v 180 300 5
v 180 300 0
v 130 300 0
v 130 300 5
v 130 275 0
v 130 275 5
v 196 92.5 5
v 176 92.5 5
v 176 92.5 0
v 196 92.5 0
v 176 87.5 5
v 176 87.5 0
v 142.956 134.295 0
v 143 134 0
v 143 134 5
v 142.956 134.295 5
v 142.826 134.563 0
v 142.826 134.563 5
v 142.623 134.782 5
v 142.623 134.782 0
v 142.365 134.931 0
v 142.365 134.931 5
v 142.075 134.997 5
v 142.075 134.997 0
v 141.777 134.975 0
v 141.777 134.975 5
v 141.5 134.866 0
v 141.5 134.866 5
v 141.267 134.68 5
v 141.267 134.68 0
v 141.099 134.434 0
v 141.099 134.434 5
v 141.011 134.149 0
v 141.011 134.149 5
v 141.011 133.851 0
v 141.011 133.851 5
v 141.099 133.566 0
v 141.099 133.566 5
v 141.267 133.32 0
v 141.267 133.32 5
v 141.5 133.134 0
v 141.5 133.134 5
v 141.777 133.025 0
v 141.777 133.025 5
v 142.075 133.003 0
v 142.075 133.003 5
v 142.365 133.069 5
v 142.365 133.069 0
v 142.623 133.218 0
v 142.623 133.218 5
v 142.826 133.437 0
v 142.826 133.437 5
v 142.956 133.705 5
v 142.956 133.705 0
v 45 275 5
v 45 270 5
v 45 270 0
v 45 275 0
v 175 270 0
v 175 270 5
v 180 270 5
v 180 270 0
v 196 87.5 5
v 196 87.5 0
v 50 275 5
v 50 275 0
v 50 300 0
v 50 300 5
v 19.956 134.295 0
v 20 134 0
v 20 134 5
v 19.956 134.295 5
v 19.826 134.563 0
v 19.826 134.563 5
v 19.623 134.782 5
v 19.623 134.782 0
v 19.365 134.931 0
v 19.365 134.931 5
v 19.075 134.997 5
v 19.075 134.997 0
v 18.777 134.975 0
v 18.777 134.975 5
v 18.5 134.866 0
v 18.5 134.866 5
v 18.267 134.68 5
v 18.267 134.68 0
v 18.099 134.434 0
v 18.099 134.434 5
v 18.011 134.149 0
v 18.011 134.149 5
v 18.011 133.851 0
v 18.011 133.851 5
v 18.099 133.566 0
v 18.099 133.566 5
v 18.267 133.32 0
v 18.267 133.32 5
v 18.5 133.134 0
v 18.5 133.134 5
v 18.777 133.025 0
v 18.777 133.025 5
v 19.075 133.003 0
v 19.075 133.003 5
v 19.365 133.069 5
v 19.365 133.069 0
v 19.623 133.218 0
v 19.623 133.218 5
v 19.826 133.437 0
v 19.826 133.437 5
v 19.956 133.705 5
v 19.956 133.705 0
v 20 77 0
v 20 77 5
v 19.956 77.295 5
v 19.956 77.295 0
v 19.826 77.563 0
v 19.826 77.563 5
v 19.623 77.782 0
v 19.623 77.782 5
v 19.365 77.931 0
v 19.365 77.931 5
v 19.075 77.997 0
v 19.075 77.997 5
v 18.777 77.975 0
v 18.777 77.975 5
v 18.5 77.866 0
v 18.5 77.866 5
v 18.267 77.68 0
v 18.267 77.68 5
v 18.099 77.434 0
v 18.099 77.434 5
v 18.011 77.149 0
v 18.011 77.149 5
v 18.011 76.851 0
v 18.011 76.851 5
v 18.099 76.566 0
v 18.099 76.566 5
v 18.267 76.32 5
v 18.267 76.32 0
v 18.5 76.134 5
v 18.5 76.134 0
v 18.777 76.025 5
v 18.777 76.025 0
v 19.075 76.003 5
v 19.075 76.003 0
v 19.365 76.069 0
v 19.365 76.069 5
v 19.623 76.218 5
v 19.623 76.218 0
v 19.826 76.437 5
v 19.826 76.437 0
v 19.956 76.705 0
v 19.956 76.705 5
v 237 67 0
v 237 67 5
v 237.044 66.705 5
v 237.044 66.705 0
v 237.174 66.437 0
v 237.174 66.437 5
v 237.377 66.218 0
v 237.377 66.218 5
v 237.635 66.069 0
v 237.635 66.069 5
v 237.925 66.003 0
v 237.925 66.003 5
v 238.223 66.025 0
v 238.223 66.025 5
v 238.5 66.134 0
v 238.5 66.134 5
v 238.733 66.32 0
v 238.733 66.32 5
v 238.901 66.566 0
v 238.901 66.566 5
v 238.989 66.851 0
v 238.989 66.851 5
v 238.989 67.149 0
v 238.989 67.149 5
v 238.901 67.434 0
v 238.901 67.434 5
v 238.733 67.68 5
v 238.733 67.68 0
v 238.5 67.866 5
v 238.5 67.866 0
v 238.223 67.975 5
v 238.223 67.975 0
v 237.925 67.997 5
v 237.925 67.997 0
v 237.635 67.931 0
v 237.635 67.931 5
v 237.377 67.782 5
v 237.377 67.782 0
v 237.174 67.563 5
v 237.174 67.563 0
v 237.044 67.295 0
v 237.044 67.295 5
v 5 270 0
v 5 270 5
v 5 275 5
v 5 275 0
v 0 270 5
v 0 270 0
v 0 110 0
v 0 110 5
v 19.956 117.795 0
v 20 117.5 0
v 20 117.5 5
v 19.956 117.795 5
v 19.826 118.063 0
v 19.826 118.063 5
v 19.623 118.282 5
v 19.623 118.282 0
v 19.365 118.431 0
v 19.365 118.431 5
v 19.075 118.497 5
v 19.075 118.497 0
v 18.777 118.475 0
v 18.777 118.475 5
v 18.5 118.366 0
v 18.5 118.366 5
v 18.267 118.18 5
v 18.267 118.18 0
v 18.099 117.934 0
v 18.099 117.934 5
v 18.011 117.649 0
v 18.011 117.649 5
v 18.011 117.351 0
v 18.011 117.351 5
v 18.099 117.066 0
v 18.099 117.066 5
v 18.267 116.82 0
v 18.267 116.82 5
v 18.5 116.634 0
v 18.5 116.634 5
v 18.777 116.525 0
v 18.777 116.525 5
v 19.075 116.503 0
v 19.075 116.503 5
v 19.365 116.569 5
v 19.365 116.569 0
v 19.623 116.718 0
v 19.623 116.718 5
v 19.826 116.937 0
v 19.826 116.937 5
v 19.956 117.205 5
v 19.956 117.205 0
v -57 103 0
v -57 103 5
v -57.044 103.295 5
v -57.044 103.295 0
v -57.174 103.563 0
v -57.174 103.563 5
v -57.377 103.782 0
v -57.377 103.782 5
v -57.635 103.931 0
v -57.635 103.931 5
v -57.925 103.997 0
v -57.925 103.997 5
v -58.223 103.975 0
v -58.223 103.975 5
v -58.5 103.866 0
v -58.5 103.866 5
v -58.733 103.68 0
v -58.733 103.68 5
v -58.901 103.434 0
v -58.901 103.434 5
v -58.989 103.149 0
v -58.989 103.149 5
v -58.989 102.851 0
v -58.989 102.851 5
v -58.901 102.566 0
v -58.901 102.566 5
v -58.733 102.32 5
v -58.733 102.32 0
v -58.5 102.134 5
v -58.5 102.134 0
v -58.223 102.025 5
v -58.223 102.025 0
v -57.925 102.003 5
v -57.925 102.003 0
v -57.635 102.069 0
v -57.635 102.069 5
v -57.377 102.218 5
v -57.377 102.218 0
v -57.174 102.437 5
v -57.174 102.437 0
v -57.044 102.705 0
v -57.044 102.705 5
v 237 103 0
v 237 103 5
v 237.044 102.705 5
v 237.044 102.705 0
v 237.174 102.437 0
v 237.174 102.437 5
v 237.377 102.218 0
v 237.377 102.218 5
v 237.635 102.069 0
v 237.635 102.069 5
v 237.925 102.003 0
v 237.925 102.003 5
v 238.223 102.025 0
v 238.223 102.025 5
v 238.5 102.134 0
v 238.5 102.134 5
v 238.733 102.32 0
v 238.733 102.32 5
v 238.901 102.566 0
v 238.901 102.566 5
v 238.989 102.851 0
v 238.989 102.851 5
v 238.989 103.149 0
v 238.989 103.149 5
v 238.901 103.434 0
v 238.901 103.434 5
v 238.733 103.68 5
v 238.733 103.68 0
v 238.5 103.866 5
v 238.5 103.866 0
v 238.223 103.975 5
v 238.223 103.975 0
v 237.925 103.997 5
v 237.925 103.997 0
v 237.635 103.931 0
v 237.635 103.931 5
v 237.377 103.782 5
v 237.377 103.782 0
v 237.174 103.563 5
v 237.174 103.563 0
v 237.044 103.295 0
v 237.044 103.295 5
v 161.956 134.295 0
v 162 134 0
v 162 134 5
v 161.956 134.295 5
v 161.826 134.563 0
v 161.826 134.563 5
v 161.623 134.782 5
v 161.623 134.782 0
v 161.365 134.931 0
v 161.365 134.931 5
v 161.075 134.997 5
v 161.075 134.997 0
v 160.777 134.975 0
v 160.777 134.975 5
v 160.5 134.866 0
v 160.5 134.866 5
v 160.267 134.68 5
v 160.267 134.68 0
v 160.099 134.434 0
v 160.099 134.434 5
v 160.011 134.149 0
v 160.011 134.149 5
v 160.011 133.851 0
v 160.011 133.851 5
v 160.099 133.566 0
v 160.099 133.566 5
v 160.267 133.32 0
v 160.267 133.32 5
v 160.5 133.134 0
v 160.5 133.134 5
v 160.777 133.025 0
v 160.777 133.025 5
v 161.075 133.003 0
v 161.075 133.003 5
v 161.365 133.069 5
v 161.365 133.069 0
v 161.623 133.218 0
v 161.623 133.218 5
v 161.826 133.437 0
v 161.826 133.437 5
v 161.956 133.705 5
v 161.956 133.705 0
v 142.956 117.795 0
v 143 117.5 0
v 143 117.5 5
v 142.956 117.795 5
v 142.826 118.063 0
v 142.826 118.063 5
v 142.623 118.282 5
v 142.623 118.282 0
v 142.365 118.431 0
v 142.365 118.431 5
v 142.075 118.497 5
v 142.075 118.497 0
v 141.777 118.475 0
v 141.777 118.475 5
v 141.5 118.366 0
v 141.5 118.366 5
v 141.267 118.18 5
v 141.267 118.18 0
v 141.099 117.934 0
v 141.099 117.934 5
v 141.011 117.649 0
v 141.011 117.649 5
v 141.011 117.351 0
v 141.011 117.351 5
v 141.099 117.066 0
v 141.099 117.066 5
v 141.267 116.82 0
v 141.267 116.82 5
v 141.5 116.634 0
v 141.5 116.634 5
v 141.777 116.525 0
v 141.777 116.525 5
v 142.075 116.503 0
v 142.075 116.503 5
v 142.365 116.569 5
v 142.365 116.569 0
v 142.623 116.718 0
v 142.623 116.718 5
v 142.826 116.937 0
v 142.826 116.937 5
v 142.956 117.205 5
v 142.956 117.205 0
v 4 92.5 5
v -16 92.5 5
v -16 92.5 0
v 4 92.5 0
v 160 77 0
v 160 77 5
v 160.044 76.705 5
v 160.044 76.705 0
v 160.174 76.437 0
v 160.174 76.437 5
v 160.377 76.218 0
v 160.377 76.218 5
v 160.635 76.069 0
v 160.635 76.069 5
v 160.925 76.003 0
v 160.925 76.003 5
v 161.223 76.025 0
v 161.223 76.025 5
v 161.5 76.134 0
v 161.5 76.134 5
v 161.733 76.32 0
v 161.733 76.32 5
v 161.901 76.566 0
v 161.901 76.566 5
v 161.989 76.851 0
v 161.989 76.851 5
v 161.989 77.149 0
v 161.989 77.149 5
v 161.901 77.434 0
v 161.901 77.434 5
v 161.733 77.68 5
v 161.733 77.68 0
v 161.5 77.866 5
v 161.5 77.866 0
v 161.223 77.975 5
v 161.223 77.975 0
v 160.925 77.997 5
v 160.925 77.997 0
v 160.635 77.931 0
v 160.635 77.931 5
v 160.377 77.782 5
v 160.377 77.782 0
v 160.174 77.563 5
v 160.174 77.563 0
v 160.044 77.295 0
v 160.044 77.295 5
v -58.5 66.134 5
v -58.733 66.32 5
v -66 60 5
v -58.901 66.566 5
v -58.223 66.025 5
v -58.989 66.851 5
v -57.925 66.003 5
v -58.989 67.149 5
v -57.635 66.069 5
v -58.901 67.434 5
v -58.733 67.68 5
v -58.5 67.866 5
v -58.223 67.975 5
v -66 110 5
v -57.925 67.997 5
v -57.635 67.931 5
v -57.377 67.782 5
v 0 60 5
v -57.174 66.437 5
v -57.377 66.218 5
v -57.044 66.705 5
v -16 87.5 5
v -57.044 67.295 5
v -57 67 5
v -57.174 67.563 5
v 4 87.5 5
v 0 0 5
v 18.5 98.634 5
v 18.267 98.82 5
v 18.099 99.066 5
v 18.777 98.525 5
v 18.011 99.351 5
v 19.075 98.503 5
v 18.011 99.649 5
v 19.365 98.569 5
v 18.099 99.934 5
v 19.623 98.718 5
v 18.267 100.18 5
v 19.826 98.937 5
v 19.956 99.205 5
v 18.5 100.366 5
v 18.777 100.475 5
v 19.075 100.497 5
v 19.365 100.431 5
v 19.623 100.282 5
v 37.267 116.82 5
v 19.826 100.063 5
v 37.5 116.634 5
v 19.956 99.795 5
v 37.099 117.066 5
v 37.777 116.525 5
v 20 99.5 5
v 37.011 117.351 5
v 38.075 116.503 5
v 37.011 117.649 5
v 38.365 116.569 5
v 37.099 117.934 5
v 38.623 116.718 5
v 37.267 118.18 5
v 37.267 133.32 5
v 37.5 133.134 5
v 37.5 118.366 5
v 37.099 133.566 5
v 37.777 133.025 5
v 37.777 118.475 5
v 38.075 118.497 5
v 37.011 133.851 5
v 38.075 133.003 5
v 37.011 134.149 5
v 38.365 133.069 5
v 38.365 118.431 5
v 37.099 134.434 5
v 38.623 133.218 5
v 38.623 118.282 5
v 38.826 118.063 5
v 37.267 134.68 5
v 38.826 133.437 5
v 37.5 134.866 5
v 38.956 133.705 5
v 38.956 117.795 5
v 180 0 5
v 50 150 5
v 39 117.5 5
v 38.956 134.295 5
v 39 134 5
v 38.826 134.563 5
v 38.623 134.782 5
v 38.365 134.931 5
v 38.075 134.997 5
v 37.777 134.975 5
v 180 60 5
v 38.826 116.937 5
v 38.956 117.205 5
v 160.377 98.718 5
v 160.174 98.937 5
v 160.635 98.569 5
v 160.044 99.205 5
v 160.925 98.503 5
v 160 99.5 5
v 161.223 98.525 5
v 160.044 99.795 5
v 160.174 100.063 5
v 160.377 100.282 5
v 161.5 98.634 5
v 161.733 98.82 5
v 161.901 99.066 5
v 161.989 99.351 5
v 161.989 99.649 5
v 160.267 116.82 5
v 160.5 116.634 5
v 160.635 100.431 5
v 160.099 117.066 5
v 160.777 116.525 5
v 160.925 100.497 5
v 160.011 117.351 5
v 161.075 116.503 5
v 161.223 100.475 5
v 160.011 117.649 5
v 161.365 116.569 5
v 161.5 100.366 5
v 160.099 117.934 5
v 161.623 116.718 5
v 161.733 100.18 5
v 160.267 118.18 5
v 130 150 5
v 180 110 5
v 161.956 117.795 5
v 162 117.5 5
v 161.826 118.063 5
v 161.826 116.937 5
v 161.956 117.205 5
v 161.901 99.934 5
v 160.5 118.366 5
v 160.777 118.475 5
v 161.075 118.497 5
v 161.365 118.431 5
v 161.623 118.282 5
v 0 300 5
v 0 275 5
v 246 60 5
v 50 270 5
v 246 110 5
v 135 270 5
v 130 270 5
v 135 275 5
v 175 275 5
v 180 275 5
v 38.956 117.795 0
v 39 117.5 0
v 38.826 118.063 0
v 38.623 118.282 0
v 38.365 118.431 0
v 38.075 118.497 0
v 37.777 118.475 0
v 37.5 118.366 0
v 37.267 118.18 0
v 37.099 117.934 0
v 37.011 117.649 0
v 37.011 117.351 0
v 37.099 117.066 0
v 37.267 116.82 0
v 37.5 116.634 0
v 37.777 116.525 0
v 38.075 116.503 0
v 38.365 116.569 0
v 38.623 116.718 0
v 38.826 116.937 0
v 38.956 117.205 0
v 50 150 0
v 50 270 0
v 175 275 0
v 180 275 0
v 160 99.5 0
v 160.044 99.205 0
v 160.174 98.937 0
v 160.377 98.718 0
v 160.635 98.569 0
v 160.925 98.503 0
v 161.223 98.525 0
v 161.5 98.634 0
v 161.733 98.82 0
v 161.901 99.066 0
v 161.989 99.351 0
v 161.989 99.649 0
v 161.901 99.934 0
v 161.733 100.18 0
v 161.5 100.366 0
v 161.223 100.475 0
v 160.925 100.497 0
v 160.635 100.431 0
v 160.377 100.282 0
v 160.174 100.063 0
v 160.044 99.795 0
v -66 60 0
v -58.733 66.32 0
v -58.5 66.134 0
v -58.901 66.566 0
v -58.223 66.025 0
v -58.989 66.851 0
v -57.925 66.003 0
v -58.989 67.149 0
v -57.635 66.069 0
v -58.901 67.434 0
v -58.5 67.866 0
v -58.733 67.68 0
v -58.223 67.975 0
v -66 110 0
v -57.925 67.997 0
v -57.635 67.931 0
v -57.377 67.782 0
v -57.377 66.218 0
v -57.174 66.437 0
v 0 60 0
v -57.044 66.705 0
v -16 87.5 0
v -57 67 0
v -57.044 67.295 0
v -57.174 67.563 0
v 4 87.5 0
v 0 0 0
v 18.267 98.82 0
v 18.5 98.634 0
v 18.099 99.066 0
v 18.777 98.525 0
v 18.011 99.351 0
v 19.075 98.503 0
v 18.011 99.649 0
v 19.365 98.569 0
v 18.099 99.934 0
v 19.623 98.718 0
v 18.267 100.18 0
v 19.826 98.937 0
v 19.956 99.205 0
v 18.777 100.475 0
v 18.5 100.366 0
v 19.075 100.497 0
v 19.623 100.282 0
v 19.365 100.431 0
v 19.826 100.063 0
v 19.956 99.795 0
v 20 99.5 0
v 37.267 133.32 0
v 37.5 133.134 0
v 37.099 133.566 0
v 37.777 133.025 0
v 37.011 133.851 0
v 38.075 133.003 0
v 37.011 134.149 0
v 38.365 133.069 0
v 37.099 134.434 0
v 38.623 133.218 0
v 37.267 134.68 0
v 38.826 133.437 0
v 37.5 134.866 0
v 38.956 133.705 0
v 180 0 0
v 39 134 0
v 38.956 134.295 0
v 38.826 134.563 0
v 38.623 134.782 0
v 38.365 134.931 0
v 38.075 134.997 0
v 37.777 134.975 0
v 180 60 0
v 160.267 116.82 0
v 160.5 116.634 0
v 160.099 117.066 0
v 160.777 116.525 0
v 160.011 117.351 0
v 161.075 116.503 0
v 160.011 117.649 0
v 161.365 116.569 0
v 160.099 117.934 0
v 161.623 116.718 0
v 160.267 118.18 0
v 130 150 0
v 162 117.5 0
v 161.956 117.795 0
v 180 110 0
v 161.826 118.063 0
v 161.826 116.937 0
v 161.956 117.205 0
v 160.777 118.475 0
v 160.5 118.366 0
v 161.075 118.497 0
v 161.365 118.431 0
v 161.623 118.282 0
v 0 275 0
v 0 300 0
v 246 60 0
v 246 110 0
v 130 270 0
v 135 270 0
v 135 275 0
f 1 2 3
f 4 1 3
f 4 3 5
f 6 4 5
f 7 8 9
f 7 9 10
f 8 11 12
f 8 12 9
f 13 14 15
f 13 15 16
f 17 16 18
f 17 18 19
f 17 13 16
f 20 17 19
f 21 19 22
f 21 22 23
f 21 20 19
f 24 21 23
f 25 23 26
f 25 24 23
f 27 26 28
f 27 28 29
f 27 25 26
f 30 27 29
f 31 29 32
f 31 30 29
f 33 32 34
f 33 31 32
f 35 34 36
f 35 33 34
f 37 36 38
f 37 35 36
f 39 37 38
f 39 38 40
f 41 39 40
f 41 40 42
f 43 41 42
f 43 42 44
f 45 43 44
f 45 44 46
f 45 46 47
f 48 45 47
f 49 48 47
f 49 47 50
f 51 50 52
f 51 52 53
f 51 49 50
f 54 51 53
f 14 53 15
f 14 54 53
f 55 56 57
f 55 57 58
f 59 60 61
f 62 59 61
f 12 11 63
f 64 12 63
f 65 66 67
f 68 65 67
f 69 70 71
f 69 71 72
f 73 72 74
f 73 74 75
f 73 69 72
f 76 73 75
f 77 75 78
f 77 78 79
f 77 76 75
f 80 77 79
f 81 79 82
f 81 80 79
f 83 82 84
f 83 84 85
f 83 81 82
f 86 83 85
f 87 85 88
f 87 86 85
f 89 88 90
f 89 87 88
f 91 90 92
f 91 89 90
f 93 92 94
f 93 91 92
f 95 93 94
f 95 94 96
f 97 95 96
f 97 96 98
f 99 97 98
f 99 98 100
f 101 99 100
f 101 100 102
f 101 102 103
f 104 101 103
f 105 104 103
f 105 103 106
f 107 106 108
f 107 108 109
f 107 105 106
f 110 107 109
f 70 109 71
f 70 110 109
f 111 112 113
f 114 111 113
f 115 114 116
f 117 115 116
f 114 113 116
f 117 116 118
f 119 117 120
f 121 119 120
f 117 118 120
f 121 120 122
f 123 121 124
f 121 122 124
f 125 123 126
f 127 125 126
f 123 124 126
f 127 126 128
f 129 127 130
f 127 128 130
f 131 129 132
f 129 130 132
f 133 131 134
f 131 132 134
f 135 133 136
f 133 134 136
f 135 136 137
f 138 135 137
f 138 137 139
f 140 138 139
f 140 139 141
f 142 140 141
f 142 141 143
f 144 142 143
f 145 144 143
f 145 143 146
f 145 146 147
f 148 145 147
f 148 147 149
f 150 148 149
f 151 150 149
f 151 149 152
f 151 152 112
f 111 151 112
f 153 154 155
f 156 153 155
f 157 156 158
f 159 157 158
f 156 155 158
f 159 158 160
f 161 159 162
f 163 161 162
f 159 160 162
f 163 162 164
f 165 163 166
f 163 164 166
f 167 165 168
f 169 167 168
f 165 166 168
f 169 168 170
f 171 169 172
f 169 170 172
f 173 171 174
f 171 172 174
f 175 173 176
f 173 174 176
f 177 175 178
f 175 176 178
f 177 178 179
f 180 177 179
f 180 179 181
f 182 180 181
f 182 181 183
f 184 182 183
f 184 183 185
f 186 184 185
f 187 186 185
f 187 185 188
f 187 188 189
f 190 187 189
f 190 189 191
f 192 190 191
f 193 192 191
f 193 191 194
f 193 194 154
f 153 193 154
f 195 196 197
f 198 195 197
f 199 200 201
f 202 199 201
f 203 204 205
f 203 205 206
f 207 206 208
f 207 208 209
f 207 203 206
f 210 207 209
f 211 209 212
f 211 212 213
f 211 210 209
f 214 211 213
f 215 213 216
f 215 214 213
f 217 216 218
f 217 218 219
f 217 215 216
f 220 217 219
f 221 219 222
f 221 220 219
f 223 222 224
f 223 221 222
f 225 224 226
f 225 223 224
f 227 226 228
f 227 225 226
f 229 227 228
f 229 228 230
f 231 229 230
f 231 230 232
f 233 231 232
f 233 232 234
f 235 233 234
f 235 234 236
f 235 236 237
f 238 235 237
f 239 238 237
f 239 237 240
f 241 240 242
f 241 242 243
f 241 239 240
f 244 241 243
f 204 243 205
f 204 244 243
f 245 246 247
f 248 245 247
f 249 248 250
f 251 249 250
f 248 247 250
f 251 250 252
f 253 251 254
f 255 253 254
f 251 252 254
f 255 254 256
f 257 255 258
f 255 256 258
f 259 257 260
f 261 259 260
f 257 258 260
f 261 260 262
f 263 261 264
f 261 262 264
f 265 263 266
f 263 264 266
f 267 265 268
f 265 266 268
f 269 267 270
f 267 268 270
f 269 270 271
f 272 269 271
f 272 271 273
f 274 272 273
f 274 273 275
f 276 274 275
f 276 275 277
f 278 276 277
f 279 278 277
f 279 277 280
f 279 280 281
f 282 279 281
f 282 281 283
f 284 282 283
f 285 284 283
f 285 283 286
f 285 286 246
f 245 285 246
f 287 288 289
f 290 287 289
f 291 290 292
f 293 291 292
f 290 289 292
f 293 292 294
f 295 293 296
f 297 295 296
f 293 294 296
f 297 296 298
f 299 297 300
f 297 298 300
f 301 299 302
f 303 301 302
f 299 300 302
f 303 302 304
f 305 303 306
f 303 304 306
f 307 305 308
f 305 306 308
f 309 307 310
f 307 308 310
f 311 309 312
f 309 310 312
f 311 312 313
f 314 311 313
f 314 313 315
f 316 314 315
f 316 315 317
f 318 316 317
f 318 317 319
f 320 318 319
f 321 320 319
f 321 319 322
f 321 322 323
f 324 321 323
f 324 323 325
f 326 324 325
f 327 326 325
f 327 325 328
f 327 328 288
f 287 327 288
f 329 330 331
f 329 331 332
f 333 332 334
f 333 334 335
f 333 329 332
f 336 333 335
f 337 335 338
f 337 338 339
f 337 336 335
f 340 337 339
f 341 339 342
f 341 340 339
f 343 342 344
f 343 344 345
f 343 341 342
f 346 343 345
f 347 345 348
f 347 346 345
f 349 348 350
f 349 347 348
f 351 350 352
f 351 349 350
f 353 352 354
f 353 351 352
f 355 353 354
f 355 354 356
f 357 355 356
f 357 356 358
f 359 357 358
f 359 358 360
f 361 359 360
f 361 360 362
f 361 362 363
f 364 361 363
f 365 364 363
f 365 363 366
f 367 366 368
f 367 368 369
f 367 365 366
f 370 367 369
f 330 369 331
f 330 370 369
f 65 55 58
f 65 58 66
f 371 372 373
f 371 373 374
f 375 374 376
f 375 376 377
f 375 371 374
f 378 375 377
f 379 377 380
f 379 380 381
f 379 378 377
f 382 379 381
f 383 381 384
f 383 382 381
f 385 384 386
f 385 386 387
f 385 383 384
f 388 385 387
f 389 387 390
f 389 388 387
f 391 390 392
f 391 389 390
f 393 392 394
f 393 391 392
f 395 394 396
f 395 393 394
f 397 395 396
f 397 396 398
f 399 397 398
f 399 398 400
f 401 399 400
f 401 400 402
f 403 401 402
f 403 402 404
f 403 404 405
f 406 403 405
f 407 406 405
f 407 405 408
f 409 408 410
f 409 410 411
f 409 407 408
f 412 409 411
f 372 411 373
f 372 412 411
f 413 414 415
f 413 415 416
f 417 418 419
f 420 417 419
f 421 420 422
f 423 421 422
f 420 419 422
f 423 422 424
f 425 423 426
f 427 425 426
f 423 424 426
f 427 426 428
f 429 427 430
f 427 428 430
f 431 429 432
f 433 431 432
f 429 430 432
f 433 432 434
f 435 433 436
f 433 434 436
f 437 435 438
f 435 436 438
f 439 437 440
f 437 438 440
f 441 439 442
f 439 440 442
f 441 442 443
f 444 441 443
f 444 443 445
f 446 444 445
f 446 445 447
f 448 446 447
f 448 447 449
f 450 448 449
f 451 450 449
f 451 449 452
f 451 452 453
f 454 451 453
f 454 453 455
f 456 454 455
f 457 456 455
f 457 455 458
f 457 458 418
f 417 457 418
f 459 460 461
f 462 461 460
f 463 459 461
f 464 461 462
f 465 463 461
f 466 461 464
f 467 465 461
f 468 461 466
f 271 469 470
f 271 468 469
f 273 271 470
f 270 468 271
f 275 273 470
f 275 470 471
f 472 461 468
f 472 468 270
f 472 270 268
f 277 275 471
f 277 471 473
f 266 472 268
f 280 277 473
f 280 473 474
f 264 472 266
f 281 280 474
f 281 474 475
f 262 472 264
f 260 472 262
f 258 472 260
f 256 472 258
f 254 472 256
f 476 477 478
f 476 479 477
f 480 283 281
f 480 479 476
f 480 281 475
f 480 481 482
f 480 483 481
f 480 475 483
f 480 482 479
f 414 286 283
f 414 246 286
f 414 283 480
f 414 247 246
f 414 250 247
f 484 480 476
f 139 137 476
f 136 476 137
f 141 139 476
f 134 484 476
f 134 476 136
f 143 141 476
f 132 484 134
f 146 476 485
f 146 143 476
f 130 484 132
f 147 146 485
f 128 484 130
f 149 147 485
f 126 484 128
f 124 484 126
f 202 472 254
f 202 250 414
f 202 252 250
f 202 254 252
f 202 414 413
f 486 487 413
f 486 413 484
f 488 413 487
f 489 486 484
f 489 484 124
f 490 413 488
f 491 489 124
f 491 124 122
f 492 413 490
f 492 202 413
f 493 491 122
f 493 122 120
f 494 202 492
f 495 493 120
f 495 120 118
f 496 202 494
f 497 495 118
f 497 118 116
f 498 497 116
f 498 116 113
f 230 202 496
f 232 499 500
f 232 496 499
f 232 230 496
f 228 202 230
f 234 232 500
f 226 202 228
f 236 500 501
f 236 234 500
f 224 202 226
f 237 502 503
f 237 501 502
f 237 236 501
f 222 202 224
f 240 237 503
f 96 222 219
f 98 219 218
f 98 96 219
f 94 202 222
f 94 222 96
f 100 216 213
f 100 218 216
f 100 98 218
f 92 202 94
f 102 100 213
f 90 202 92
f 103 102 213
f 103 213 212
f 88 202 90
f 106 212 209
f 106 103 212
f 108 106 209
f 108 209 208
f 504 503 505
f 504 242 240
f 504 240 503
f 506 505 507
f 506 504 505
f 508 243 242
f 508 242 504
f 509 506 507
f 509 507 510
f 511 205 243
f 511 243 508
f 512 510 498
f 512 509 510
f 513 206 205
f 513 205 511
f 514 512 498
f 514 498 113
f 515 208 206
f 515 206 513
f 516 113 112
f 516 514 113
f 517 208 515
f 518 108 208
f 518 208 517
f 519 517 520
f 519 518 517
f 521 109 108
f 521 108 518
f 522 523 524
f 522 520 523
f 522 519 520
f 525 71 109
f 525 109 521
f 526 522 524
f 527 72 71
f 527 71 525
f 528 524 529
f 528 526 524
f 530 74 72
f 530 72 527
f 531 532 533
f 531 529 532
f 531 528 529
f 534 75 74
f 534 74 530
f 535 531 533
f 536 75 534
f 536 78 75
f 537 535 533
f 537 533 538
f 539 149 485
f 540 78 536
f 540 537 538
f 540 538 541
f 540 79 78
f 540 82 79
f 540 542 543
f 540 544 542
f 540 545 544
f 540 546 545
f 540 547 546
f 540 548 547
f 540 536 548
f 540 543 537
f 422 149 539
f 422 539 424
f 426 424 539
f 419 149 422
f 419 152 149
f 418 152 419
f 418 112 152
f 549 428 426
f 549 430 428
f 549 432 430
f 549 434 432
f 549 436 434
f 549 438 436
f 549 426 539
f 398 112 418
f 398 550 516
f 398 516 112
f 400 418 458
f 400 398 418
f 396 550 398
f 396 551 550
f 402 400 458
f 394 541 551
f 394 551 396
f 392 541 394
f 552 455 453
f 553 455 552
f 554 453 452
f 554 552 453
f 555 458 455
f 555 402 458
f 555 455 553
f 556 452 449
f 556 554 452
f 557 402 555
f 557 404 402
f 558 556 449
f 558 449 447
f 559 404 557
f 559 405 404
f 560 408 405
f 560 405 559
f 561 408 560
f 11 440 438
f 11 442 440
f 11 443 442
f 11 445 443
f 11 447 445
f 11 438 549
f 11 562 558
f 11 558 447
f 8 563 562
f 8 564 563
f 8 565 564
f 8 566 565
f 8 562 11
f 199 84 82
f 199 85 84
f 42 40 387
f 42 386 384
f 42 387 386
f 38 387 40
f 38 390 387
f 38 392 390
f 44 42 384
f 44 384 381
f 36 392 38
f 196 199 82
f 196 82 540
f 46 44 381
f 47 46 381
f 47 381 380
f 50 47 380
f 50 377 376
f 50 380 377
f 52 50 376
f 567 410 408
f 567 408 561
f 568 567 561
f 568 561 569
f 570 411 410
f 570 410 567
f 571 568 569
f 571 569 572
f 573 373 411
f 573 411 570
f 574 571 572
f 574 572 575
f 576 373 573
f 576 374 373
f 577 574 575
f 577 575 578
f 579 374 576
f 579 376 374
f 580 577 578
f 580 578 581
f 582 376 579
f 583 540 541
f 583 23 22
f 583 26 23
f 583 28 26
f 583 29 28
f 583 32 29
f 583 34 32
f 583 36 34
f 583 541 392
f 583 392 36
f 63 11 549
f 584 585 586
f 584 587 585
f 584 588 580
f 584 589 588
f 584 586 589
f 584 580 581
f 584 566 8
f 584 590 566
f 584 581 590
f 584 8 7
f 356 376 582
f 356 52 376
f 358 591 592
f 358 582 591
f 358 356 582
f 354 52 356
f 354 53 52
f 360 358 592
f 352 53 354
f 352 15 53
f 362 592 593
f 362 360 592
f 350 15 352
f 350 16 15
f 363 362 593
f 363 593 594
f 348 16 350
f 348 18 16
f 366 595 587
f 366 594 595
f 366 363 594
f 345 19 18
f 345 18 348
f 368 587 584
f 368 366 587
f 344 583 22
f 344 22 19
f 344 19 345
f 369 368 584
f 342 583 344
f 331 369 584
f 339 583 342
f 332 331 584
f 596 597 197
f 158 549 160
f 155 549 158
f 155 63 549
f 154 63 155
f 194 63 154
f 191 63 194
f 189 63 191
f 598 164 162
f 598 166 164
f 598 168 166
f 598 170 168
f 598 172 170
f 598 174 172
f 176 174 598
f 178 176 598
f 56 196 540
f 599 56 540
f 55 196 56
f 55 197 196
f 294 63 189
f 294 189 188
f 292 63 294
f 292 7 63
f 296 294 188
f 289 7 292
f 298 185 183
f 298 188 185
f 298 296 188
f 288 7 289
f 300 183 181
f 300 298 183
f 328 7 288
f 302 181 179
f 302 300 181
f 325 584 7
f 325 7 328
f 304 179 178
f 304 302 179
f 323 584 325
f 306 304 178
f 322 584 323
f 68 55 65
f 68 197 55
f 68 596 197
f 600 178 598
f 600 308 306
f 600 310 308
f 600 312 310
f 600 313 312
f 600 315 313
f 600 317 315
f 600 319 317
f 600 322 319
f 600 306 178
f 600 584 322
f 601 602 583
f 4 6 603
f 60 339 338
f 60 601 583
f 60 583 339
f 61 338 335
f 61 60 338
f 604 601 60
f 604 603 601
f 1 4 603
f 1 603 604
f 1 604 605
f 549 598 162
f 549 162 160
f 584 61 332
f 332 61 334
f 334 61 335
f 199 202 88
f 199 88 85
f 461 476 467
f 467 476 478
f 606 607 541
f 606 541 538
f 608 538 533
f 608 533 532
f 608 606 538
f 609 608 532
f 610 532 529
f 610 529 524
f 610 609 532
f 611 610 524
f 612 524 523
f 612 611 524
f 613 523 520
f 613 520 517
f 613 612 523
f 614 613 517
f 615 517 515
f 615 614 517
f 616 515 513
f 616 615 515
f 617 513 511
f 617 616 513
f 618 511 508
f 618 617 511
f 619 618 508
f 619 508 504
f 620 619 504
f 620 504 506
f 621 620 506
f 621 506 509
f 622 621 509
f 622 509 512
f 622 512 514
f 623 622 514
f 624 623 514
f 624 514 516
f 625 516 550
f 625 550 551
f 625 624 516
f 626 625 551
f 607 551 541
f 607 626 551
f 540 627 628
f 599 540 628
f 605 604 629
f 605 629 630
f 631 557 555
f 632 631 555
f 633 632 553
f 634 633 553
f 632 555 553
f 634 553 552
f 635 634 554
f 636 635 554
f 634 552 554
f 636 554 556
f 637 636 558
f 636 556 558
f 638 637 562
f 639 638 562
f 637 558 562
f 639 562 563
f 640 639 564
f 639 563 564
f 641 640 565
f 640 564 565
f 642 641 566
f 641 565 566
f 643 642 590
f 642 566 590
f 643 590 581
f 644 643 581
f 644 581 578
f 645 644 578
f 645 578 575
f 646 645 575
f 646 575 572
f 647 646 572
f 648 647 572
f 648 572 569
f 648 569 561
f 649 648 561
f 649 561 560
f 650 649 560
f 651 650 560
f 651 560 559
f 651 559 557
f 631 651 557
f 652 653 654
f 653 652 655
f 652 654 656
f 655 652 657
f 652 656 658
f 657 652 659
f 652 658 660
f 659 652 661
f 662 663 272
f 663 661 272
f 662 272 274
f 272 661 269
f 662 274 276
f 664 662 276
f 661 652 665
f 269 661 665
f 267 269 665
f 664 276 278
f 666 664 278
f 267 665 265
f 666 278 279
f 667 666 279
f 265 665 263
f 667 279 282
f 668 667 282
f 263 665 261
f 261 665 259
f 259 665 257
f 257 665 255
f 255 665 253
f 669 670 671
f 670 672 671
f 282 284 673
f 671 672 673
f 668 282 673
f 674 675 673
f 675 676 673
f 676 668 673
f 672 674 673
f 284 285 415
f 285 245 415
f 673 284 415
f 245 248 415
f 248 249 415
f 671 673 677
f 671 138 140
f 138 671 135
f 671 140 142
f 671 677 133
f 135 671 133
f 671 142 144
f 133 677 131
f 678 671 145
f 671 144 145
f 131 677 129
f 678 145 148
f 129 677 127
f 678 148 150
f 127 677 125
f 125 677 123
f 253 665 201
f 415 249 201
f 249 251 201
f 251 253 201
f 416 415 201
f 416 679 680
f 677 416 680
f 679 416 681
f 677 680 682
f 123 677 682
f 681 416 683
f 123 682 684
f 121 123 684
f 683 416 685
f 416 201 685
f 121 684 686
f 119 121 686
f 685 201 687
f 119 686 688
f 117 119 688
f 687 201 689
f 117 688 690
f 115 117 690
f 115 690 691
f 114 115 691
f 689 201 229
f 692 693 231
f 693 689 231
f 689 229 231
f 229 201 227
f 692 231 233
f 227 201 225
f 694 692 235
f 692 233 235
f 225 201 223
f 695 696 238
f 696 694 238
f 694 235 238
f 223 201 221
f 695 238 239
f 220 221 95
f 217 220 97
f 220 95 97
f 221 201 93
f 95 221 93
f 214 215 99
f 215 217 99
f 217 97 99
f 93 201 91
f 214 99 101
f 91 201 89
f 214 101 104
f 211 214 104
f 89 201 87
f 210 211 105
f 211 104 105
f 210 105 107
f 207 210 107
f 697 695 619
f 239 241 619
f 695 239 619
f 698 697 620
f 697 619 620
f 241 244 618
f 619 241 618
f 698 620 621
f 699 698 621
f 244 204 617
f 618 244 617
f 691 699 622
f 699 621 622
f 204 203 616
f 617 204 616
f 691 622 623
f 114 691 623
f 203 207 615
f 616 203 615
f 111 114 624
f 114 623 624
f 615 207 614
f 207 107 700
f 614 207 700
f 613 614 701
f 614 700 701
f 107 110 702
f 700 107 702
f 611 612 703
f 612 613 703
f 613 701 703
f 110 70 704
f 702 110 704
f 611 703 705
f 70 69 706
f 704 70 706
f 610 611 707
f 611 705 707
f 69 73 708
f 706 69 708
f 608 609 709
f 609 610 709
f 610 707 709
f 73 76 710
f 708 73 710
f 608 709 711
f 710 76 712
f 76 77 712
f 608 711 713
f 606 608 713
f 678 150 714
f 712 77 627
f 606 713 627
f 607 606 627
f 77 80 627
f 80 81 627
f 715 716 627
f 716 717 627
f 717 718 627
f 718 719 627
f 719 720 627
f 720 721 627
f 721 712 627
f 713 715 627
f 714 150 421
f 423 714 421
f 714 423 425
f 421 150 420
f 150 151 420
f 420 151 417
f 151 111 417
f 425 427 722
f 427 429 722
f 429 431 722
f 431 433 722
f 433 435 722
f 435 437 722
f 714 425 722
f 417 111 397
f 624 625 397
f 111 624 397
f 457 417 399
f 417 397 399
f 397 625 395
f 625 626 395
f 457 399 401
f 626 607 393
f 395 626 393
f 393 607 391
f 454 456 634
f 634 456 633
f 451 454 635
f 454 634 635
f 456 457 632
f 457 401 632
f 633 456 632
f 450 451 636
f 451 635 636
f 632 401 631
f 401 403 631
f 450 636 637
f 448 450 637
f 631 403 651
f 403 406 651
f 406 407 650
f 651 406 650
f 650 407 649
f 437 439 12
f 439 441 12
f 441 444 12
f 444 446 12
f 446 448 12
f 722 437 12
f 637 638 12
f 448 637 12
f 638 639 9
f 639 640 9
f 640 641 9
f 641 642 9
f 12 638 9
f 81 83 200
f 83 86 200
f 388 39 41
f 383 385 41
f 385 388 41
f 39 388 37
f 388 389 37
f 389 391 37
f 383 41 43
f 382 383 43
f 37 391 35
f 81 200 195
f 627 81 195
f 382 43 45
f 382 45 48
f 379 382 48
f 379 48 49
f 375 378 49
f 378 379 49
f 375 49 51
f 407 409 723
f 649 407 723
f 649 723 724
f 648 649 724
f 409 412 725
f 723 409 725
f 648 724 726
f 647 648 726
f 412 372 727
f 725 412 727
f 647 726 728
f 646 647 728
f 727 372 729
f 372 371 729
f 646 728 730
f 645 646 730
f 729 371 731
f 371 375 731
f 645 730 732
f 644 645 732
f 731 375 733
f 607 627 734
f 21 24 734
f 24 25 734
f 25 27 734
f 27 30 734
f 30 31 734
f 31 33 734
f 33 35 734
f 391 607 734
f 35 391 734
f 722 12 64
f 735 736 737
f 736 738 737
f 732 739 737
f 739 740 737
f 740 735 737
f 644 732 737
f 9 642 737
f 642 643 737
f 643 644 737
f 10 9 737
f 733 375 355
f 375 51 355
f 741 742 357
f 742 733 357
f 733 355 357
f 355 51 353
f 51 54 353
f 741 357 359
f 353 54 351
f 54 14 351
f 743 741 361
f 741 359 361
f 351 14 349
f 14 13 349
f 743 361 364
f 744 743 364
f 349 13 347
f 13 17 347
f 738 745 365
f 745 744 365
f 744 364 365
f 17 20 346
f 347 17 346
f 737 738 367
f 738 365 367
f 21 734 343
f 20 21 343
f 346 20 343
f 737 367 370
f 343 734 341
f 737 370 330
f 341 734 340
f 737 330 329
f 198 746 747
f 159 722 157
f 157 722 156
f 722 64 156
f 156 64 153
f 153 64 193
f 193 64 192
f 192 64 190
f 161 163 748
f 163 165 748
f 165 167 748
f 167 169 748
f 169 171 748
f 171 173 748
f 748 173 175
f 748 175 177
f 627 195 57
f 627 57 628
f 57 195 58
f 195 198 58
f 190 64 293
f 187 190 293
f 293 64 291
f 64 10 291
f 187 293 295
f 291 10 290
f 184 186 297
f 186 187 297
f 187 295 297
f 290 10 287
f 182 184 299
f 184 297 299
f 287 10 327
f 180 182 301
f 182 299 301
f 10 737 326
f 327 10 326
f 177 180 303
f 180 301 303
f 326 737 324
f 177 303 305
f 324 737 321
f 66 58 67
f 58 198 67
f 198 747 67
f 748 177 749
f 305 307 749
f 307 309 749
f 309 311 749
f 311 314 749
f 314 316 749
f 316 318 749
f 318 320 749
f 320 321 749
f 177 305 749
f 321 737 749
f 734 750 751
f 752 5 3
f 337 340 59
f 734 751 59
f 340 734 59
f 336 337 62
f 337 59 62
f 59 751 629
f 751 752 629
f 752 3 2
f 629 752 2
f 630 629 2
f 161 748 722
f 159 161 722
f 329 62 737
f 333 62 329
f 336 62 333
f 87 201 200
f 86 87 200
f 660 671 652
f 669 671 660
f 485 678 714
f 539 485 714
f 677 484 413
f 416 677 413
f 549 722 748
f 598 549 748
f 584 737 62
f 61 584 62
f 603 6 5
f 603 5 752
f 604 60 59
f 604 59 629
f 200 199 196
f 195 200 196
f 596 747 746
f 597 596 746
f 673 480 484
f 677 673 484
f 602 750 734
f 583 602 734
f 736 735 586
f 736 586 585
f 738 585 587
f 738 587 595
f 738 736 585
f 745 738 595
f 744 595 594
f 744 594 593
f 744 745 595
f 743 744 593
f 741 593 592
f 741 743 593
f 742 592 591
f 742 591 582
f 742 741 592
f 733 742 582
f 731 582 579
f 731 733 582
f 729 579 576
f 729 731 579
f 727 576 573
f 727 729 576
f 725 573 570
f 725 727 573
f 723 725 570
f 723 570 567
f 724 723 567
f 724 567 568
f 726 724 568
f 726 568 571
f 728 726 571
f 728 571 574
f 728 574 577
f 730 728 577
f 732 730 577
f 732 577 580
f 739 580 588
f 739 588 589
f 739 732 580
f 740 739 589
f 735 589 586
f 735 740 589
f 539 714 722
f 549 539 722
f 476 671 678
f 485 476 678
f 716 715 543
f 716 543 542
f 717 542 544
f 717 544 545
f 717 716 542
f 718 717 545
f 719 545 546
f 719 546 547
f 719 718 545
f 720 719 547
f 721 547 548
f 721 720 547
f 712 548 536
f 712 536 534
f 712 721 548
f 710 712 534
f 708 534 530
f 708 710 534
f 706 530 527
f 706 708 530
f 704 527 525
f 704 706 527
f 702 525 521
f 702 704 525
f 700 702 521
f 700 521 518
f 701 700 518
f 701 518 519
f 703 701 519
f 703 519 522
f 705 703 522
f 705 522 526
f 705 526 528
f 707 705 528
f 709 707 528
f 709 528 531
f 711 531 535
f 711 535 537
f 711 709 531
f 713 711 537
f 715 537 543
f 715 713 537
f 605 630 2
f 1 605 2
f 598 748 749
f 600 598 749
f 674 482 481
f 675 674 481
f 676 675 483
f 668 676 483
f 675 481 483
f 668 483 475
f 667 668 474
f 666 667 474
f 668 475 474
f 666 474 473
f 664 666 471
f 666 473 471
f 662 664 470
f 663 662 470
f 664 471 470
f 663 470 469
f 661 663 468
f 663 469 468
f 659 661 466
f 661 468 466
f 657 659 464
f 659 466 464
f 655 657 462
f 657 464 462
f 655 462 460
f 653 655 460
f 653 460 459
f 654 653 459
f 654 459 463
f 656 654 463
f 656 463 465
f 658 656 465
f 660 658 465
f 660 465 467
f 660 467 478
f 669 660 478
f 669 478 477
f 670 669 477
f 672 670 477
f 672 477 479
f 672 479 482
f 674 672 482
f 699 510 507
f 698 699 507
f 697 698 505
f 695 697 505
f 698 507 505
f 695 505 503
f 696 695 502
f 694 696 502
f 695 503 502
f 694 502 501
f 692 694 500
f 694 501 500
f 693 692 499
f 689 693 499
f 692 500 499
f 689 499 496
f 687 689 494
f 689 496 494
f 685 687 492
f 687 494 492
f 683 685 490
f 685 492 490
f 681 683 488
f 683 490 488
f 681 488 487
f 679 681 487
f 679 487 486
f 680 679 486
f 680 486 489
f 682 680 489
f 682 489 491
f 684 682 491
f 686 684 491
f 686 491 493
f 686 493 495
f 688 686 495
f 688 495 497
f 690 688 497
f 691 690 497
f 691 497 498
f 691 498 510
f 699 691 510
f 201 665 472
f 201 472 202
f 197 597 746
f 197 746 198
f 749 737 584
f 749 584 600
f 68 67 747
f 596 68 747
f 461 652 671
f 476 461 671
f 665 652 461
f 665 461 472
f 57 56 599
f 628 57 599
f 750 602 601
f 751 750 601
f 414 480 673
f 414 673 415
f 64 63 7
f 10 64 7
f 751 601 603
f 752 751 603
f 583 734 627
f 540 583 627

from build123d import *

# Parameters (mm, degrees)
SKETCH1_W           = 66
SKETCH1_H           = 50
SKETCH1_R           = 1
BOSS_EXTRUDE1_DEPTH = 5
SKETCH2_R           = 1
CUT_EXTRUDE1_DEPTH  = 388.996134001
SKETCH3_R           = 1
SKETCH3_W           = 20
SKETCH3_H           = 5
CUT_EXTRUDE2_DEPTH  = 388.996134001
SKETCH4_W           = 5
SKETCH4_H           = 5
CUT_EXTRUDE3_DEPTH  = 388.996134001


with BuildPart() as part:
    # Sketch1 → Boss-Extrude1 (new body)
    # profile 1 of 3: a face of its own
    with BuildSketch(Plane.XY):
        with Locations((-33, 85)):
            Rectangle(SKETCH1_W, SKETCH1_H)
    # profile 2 of 3: a face of its own
    with BuildSketch(Plane.XY):
        Polygon((0, 60), (0, 0), (180, 0), (180, 60), (180, 110), (180, 300), (130, 300), (130, 150), (50, 150), (50, 300), (0, 300), (0, 110), align=None)
        with Locations((19, 117.5)):
            Circle(SKETCH1_R, mode=Mode.SUBTRACT)
        with Locations((38, 117.5)):
            Circle(SKETCH1_R, mode=Mode.SUBTRACT)
        with Locations((19, 134)):
            Circle(SKETCH1_R, mode=Mode.SUBTRACT)
        with Locations((38, 134)):
            Circle(SKETCH1_R, mode=Mode.SUBTRACT)
        with Locations((142, 117.5)):
            Circle(SKETCH1_R, mode=Mode.SUBTRACT)
        with Locations((161, 117.5)):
            Circle(SKETCH1_R, mode=Mode.SUBTRACT)
        with Locations((142, 134)):
            Circle(SKETCH1_R, mode=Mode.SUBTRACT)
        with Locations((161, 134)):
            Circle(SKETCH1_R, mode=Mode.SUBTRACT)
    # profile 3 of 3: a face of its own
    with BuildSketch(Plane.XY):
        with Locations((213, 85)):
            Rectangle(SKETCH1_W, SKETCH1_H)
    extrude(amount=BOSS_EXTRUDE1_DEPTH)

    # Sketch2 → Cut-Extrude1 (cut, through all)
    with BuildSketch(Plane.XY.offset(5)):
        with Locations((-58, 103)):
            Circle(SKETCH2_R)
        with Locations((-58, 67)):
            Circle(SKETCH2_R)
        with Locations(Location((238, 67, 0), (0, 0, 180))):
            Circle(SKETCH2_R)
        with Locations(Location((238, 103, 0), (0, 0, 180))):
            Circle(SKETCH2_R)
    extrude(amount=-CUT_EXTRUDE1_DEPTH, mode=Mode.SUBTRACT)

    # Sketch3 → Cut-Extrude2 (cut, through all)
    with BuildSketch(Plane.XY.offset(5)):
        with Locations((19, 77)):
            Circle(SKETCH3_R)
        with Locations((19, 99.5)):
            Circle(SKETCH3_R)
        with Locations(Location((161, 77, 0), (0, 0, 180))):
            Circle(SKETCH3_R)
        with Locations(Location((161, 99.5, 0), (0, 0, 180))):
            Circle(SKETCH3_R)
        with Locations((-6, 90)):
            Rectangle(SKETCH3_W, SKETCH3_H)
        with Locations((186, 90)):
            Rectangle(SKETCH3_W, SKETCH3_H)
    extrude(amount=-CUT_EXTRUDE2_DEPTH, mode=Mode.SUBTRACT)

    # Sketch4 → Cut-Extrude3 (cut, through all)
    with BuildSketch(Plane.XY.offset(5)):
        with Locations((2.5, 272.5)):
            Rectangle(SKETCH4_W, SKETCH4_H)
        with Locations((47.5, 272.5)):
            Rectangle(SKETCH4_W, SKETCH4_H)
        with Locations((132.5, 272.5)):
            Rectangle(SKETCH4_W, SKETCH4_H)
        with Locations((177.5, 272.5)):
            Rectangle(SKETCH4_W, SKETCH4_H)
    extrude(amount=-CUT_EXTRUDE3_DEPTH, mode=Mode.SUBTRACT)


solid = part.part
